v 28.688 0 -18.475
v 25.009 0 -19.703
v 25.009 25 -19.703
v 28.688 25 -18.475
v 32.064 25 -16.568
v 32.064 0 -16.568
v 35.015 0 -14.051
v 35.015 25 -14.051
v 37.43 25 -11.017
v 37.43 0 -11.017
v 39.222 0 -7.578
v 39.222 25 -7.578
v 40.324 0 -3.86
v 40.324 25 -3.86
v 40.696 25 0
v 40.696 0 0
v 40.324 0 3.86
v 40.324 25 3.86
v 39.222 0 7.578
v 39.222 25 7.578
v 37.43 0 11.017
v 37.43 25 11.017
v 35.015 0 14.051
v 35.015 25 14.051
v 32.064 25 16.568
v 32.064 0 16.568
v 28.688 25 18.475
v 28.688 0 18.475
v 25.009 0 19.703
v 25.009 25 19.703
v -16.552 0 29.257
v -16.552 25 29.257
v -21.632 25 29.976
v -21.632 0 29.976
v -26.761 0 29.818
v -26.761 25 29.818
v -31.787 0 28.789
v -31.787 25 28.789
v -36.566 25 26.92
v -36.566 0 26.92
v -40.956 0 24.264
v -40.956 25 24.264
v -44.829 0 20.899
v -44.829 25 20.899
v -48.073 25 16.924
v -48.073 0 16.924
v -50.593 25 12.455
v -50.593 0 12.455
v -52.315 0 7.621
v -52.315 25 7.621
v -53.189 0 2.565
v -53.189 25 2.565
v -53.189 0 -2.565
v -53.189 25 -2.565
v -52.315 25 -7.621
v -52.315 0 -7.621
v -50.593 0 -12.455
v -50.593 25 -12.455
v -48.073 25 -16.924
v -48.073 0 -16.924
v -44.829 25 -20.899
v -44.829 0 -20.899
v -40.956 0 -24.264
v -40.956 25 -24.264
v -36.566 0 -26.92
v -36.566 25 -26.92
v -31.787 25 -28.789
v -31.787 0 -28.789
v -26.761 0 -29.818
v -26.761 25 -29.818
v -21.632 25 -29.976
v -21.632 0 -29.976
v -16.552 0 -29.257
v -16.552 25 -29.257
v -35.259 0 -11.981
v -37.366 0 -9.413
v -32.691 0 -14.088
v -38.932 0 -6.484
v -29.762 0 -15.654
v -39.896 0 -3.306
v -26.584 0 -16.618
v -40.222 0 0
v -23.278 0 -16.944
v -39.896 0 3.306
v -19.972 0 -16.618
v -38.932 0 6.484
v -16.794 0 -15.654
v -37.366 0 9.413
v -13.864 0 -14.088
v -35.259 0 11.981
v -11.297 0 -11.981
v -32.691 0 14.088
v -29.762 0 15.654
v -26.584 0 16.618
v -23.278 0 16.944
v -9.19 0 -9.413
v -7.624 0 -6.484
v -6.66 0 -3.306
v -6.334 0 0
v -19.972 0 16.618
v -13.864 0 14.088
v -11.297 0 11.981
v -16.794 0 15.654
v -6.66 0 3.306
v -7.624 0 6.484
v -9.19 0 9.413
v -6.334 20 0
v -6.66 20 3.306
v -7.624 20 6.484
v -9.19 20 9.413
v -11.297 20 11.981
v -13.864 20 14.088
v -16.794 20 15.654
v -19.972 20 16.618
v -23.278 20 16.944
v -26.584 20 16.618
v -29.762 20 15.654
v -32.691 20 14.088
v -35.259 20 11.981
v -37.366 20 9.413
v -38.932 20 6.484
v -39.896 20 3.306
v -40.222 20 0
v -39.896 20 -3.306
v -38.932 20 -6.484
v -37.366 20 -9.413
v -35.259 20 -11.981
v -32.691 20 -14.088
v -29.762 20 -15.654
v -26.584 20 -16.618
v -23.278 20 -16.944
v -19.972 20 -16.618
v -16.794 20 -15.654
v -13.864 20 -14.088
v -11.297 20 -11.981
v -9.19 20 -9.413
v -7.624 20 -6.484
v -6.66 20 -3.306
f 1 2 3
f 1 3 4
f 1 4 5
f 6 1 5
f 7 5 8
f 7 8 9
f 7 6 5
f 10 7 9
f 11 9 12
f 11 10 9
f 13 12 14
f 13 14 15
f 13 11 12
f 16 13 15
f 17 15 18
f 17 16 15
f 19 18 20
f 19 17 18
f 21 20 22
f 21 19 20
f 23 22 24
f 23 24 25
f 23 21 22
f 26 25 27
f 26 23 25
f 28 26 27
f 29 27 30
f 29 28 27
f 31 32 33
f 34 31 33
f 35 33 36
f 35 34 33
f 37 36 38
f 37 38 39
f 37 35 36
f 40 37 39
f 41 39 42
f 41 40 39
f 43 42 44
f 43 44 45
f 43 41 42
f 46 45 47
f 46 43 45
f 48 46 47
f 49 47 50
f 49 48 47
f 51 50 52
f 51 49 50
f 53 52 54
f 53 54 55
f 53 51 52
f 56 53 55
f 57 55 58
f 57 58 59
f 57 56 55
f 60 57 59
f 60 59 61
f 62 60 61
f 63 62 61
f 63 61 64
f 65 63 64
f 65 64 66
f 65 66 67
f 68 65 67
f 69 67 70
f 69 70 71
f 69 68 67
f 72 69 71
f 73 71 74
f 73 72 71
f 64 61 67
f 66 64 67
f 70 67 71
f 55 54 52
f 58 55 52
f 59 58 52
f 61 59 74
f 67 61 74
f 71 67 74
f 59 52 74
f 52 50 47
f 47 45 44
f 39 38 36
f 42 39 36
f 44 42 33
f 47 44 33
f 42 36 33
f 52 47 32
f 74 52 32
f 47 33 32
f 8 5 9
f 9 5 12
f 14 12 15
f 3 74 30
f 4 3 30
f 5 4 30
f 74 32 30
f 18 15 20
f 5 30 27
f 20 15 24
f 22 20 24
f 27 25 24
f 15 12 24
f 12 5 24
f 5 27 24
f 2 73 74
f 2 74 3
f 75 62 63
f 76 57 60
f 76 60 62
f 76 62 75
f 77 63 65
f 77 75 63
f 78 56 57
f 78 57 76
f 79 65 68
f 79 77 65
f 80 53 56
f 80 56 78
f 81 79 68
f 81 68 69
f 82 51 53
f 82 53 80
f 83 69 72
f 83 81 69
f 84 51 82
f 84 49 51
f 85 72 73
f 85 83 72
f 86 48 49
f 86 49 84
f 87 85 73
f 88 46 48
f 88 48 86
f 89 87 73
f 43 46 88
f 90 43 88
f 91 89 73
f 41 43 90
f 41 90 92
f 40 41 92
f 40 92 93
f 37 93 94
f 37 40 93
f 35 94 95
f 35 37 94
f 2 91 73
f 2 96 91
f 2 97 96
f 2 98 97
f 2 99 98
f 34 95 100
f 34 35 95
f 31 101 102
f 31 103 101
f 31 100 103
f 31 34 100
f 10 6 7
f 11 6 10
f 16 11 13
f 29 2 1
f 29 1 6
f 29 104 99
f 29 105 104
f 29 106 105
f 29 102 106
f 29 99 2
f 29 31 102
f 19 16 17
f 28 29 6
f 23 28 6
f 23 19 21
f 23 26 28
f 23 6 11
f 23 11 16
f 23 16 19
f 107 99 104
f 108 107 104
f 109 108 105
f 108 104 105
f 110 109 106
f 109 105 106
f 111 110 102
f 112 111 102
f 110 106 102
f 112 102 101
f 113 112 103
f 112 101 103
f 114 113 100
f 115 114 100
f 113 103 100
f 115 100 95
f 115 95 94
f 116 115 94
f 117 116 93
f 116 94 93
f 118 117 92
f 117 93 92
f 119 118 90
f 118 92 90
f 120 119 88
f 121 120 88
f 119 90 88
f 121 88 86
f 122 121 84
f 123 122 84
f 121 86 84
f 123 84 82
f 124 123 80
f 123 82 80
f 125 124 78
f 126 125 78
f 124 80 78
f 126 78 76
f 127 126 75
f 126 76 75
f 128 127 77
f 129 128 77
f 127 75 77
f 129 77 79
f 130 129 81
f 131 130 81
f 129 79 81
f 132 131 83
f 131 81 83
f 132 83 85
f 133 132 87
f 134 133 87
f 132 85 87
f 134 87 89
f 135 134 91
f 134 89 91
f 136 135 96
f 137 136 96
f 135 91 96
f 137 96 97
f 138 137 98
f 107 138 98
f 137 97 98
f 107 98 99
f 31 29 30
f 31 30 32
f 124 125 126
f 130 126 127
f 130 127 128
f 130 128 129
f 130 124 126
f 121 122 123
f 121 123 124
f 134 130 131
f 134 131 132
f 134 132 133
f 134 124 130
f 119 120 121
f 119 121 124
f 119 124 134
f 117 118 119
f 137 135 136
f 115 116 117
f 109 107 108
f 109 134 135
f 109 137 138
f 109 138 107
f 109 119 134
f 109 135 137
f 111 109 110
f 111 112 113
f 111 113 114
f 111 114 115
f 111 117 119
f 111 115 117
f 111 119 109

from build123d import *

# Parameters (mm, degrees)
F1_DEPTH = 25
F2_R     = 16.943766
F3_DEPTH = 20


with BuildPart() as f1:
    # F0 (on Front) → F1 (new body)
    with BuildSketch(Plane.XZ):
        with BuildLine():
            Line((25.009147, 19.70269), (-16.551667, 29.257499))
            ThreePointArc((-16.551667, 29.257499), (-53.298677, 0), (-16.551667, -29.257499))
            Line((-16.551667, -29.257499), (25.009147, -19.70269))
            ThreePointArc((25.009147, -19.70269), (40.696177, 0), (25.009147, 19.70269))
        make_face()
    extrude(amount=-F1_DEPTH)

    # F2 (on face) → F3 (cut)
    with BuildSketch(Plane.XZ):
        with Locations((-23.27795, 0)):
            Circle(F2_R)
    extrude(amount=-F3_DEPTH, mode=Mode.SUBTRACT)


solid = f1.part
